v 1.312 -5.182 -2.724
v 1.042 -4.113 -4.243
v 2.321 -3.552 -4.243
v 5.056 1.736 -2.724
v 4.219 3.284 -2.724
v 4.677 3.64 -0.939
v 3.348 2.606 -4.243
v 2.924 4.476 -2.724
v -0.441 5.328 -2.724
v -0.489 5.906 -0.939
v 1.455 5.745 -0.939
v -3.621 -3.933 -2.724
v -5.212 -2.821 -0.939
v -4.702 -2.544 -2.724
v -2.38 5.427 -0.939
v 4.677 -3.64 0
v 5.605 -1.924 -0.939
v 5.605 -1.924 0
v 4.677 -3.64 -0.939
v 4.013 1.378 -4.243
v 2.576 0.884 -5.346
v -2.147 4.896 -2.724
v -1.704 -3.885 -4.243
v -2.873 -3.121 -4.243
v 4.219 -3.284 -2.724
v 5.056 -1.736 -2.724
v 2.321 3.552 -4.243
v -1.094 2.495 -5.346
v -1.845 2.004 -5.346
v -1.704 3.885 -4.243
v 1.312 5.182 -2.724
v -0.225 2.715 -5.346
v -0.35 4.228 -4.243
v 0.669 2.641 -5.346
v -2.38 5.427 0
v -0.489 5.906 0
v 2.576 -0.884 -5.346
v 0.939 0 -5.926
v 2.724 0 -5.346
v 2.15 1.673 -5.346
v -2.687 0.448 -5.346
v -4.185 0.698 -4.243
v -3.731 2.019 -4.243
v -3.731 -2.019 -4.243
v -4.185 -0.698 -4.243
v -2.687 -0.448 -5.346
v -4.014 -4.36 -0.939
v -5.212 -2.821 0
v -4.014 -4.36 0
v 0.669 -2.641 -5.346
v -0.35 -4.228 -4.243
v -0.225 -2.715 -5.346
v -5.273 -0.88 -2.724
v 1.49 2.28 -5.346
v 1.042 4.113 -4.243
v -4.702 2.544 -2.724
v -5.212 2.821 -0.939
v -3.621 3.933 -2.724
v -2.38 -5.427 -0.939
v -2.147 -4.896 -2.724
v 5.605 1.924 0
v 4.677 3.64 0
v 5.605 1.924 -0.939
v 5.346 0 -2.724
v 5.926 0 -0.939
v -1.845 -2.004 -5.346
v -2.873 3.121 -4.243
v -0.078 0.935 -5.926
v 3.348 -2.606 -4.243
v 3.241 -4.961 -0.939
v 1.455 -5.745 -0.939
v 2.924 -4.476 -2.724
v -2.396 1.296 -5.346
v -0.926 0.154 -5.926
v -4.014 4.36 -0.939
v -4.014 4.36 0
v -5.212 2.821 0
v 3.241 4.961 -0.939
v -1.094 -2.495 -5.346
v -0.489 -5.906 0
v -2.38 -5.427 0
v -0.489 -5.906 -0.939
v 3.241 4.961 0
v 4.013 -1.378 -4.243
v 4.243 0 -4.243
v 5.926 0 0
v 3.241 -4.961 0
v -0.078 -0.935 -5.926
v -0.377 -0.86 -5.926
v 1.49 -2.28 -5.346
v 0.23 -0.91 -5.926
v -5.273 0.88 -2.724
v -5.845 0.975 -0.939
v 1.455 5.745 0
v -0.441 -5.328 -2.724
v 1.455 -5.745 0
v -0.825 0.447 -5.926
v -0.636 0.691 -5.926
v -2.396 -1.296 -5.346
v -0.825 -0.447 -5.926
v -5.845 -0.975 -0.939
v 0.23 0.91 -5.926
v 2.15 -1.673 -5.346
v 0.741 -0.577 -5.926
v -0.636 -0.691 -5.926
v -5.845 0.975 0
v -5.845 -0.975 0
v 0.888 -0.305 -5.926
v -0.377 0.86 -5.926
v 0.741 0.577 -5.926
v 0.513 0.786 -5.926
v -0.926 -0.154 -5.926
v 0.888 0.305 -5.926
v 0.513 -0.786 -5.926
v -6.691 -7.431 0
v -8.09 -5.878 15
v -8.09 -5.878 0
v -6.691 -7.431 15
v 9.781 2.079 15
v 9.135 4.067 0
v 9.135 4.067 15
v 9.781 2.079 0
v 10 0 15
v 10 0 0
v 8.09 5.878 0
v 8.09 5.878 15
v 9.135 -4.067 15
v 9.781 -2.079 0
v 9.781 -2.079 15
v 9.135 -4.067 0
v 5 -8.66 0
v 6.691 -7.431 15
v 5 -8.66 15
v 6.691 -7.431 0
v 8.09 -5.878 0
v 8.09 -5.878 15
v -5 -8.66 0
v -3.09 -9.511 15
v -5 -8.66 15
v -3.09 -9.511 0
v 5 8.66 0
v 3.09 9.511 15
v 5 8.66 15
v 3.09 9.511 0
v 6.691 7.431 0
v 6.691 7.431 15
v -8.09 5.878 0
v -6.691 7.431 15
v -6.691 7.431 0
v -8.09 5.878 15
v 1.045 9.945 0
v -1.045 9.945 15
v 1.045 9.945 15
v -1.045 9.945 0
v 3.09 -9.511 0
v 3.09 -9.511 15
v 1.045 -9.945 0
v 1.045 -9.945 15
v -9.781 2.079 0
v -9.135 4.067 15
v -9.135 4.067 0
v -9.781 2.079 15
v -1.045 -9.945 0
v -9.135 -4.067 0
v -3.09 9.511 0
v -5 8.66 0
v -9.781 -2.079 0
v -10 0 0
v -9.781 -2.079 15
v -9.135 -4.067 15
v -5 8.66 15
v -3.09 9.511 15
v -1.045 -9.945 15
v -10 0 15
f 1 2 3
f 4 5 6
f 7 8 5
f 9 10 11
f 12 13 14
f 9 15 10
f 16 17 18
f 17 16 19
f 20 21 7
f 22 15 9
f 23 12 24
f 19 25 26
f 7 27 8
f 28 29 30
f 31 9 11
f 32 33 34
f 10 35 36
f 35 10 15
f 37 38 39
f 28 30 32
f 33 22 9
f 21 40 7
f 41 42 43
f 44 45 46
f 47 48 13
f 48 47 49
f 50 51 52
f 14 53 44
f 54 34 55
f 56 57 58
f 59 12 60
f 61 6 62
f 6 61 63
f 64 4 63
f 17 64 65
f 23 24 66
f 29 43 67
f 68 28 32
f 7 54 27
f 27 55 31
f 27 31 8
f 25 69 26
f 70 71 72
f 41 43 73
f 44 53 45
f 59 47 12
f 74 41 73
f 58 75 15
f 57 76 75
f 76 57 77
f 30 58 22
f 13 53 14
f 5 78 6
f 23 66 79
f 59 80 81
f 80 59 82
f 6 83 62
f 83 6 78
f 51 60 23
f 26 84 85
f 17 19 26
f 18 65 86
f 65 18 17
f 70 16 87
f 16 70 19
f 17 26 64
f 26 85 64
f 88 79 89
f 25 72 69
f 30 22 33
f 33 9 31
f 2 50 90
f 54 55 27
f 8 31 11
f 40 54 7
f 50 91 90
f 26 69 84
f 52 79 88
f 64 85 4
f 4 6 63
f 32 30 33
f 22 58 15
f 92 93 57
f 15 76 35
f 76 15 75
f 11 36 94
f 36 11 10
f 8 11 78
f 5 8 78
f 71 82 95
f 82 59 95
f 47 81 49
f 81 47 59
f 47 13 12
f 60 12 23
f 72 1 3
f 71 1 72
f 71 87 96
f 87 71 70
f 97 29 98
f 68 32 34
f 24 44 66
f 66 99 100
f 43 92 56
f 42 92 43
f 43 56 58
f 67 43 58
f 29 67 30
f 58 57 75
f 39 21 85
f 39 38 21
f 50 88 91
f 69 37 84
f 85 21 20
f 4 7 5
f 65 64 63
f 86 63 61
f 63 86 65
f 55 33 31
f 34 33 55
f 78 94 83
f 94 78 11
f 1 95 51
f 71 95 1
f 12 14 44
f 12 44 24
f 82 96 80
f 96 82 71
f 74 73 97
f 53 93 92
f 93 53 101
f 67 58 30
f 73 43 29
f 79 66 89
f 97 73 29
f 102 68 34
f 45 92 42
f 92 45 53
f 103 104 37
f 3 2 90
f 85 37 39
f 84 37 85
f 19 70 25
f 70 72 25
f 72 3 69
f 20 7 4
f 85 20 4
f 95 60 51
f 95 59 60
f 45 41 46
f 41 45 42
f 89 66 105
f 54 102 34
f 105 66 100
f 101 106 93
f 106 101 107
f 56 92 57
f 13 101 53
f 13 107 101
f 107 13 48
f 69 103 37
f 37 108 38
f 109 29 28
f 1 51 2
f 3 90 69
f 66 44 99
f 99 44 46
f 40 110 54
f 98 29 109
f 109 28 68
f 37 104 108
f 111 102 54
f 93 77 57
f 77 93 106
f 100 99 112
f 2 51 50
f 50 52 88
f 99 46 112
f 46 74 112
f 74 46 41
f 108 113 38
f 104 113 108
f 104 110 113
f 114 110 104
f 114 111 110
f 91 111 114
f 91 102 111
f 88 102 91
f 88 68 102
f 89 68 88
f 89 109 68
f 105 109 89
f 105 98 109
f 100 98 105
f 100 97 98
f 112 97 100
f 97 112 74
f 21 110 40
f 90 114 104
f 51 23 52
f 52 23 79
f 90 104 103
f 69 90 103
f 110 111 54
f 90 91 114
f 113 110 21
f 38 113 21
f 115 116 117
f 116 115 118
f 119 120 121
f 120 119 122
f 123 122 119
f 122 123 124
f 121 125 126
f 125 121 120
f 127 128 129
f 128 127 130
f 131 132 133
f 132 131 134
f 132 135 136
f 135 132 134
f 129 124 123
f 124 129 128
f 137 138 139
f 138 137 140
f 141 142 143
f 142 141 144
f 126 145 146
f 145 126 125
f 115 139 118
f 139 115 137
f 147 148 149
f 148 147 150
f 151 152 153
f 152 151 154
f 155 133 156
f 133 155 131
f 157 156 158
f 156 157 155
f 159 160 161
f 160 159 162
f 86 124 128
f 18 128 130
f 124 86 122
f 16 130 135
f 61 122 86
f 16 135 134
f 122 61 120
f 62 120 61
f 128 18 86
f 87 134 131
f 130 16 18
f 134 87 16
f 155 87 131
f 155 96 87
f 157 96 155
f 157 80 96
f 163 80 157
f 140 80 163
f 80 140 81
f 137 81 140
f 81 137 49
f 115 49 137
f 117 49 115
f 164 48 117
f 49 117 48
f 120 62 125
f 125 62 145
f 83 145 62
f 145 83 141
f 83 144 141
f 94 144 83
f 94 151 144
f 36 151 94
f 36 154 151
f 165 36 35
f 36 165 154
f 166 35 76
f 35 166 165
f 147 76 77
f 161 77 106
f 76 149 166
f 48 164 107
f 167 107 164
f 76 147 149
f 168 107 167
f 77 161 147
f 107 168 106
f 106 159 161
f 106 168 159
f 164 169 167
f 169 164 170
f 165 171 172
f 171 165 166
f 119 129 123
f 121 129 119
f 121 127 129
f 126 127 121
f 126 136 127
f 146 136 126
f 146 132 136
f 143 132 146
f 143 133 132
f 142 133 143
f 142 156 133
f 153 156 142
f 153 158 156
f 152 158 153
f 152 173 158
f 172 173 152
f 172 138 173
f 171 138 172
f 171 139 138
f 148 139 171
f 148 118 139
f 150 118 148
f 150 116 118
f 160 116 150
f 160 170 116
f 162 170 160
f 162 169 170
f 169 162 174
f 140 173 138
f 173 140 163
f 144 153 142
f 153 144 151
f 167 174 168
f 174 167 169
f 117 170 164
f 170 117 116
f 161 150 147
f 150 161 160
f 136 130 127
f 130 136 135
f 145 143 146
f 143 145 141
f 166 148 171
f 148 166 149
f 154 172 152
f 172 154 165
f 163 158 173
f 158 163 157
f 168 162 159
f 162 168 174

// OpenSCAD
// Generated by generate_scads.py
union() {
  sphere(r=6);
  difference() {
    sphere(r=4);
    cube(size=[5,30,20], center=false);
    sphere(r=8);
  }
  union() {
    cylinder(h=15, r=10, center=false);
  }
}
